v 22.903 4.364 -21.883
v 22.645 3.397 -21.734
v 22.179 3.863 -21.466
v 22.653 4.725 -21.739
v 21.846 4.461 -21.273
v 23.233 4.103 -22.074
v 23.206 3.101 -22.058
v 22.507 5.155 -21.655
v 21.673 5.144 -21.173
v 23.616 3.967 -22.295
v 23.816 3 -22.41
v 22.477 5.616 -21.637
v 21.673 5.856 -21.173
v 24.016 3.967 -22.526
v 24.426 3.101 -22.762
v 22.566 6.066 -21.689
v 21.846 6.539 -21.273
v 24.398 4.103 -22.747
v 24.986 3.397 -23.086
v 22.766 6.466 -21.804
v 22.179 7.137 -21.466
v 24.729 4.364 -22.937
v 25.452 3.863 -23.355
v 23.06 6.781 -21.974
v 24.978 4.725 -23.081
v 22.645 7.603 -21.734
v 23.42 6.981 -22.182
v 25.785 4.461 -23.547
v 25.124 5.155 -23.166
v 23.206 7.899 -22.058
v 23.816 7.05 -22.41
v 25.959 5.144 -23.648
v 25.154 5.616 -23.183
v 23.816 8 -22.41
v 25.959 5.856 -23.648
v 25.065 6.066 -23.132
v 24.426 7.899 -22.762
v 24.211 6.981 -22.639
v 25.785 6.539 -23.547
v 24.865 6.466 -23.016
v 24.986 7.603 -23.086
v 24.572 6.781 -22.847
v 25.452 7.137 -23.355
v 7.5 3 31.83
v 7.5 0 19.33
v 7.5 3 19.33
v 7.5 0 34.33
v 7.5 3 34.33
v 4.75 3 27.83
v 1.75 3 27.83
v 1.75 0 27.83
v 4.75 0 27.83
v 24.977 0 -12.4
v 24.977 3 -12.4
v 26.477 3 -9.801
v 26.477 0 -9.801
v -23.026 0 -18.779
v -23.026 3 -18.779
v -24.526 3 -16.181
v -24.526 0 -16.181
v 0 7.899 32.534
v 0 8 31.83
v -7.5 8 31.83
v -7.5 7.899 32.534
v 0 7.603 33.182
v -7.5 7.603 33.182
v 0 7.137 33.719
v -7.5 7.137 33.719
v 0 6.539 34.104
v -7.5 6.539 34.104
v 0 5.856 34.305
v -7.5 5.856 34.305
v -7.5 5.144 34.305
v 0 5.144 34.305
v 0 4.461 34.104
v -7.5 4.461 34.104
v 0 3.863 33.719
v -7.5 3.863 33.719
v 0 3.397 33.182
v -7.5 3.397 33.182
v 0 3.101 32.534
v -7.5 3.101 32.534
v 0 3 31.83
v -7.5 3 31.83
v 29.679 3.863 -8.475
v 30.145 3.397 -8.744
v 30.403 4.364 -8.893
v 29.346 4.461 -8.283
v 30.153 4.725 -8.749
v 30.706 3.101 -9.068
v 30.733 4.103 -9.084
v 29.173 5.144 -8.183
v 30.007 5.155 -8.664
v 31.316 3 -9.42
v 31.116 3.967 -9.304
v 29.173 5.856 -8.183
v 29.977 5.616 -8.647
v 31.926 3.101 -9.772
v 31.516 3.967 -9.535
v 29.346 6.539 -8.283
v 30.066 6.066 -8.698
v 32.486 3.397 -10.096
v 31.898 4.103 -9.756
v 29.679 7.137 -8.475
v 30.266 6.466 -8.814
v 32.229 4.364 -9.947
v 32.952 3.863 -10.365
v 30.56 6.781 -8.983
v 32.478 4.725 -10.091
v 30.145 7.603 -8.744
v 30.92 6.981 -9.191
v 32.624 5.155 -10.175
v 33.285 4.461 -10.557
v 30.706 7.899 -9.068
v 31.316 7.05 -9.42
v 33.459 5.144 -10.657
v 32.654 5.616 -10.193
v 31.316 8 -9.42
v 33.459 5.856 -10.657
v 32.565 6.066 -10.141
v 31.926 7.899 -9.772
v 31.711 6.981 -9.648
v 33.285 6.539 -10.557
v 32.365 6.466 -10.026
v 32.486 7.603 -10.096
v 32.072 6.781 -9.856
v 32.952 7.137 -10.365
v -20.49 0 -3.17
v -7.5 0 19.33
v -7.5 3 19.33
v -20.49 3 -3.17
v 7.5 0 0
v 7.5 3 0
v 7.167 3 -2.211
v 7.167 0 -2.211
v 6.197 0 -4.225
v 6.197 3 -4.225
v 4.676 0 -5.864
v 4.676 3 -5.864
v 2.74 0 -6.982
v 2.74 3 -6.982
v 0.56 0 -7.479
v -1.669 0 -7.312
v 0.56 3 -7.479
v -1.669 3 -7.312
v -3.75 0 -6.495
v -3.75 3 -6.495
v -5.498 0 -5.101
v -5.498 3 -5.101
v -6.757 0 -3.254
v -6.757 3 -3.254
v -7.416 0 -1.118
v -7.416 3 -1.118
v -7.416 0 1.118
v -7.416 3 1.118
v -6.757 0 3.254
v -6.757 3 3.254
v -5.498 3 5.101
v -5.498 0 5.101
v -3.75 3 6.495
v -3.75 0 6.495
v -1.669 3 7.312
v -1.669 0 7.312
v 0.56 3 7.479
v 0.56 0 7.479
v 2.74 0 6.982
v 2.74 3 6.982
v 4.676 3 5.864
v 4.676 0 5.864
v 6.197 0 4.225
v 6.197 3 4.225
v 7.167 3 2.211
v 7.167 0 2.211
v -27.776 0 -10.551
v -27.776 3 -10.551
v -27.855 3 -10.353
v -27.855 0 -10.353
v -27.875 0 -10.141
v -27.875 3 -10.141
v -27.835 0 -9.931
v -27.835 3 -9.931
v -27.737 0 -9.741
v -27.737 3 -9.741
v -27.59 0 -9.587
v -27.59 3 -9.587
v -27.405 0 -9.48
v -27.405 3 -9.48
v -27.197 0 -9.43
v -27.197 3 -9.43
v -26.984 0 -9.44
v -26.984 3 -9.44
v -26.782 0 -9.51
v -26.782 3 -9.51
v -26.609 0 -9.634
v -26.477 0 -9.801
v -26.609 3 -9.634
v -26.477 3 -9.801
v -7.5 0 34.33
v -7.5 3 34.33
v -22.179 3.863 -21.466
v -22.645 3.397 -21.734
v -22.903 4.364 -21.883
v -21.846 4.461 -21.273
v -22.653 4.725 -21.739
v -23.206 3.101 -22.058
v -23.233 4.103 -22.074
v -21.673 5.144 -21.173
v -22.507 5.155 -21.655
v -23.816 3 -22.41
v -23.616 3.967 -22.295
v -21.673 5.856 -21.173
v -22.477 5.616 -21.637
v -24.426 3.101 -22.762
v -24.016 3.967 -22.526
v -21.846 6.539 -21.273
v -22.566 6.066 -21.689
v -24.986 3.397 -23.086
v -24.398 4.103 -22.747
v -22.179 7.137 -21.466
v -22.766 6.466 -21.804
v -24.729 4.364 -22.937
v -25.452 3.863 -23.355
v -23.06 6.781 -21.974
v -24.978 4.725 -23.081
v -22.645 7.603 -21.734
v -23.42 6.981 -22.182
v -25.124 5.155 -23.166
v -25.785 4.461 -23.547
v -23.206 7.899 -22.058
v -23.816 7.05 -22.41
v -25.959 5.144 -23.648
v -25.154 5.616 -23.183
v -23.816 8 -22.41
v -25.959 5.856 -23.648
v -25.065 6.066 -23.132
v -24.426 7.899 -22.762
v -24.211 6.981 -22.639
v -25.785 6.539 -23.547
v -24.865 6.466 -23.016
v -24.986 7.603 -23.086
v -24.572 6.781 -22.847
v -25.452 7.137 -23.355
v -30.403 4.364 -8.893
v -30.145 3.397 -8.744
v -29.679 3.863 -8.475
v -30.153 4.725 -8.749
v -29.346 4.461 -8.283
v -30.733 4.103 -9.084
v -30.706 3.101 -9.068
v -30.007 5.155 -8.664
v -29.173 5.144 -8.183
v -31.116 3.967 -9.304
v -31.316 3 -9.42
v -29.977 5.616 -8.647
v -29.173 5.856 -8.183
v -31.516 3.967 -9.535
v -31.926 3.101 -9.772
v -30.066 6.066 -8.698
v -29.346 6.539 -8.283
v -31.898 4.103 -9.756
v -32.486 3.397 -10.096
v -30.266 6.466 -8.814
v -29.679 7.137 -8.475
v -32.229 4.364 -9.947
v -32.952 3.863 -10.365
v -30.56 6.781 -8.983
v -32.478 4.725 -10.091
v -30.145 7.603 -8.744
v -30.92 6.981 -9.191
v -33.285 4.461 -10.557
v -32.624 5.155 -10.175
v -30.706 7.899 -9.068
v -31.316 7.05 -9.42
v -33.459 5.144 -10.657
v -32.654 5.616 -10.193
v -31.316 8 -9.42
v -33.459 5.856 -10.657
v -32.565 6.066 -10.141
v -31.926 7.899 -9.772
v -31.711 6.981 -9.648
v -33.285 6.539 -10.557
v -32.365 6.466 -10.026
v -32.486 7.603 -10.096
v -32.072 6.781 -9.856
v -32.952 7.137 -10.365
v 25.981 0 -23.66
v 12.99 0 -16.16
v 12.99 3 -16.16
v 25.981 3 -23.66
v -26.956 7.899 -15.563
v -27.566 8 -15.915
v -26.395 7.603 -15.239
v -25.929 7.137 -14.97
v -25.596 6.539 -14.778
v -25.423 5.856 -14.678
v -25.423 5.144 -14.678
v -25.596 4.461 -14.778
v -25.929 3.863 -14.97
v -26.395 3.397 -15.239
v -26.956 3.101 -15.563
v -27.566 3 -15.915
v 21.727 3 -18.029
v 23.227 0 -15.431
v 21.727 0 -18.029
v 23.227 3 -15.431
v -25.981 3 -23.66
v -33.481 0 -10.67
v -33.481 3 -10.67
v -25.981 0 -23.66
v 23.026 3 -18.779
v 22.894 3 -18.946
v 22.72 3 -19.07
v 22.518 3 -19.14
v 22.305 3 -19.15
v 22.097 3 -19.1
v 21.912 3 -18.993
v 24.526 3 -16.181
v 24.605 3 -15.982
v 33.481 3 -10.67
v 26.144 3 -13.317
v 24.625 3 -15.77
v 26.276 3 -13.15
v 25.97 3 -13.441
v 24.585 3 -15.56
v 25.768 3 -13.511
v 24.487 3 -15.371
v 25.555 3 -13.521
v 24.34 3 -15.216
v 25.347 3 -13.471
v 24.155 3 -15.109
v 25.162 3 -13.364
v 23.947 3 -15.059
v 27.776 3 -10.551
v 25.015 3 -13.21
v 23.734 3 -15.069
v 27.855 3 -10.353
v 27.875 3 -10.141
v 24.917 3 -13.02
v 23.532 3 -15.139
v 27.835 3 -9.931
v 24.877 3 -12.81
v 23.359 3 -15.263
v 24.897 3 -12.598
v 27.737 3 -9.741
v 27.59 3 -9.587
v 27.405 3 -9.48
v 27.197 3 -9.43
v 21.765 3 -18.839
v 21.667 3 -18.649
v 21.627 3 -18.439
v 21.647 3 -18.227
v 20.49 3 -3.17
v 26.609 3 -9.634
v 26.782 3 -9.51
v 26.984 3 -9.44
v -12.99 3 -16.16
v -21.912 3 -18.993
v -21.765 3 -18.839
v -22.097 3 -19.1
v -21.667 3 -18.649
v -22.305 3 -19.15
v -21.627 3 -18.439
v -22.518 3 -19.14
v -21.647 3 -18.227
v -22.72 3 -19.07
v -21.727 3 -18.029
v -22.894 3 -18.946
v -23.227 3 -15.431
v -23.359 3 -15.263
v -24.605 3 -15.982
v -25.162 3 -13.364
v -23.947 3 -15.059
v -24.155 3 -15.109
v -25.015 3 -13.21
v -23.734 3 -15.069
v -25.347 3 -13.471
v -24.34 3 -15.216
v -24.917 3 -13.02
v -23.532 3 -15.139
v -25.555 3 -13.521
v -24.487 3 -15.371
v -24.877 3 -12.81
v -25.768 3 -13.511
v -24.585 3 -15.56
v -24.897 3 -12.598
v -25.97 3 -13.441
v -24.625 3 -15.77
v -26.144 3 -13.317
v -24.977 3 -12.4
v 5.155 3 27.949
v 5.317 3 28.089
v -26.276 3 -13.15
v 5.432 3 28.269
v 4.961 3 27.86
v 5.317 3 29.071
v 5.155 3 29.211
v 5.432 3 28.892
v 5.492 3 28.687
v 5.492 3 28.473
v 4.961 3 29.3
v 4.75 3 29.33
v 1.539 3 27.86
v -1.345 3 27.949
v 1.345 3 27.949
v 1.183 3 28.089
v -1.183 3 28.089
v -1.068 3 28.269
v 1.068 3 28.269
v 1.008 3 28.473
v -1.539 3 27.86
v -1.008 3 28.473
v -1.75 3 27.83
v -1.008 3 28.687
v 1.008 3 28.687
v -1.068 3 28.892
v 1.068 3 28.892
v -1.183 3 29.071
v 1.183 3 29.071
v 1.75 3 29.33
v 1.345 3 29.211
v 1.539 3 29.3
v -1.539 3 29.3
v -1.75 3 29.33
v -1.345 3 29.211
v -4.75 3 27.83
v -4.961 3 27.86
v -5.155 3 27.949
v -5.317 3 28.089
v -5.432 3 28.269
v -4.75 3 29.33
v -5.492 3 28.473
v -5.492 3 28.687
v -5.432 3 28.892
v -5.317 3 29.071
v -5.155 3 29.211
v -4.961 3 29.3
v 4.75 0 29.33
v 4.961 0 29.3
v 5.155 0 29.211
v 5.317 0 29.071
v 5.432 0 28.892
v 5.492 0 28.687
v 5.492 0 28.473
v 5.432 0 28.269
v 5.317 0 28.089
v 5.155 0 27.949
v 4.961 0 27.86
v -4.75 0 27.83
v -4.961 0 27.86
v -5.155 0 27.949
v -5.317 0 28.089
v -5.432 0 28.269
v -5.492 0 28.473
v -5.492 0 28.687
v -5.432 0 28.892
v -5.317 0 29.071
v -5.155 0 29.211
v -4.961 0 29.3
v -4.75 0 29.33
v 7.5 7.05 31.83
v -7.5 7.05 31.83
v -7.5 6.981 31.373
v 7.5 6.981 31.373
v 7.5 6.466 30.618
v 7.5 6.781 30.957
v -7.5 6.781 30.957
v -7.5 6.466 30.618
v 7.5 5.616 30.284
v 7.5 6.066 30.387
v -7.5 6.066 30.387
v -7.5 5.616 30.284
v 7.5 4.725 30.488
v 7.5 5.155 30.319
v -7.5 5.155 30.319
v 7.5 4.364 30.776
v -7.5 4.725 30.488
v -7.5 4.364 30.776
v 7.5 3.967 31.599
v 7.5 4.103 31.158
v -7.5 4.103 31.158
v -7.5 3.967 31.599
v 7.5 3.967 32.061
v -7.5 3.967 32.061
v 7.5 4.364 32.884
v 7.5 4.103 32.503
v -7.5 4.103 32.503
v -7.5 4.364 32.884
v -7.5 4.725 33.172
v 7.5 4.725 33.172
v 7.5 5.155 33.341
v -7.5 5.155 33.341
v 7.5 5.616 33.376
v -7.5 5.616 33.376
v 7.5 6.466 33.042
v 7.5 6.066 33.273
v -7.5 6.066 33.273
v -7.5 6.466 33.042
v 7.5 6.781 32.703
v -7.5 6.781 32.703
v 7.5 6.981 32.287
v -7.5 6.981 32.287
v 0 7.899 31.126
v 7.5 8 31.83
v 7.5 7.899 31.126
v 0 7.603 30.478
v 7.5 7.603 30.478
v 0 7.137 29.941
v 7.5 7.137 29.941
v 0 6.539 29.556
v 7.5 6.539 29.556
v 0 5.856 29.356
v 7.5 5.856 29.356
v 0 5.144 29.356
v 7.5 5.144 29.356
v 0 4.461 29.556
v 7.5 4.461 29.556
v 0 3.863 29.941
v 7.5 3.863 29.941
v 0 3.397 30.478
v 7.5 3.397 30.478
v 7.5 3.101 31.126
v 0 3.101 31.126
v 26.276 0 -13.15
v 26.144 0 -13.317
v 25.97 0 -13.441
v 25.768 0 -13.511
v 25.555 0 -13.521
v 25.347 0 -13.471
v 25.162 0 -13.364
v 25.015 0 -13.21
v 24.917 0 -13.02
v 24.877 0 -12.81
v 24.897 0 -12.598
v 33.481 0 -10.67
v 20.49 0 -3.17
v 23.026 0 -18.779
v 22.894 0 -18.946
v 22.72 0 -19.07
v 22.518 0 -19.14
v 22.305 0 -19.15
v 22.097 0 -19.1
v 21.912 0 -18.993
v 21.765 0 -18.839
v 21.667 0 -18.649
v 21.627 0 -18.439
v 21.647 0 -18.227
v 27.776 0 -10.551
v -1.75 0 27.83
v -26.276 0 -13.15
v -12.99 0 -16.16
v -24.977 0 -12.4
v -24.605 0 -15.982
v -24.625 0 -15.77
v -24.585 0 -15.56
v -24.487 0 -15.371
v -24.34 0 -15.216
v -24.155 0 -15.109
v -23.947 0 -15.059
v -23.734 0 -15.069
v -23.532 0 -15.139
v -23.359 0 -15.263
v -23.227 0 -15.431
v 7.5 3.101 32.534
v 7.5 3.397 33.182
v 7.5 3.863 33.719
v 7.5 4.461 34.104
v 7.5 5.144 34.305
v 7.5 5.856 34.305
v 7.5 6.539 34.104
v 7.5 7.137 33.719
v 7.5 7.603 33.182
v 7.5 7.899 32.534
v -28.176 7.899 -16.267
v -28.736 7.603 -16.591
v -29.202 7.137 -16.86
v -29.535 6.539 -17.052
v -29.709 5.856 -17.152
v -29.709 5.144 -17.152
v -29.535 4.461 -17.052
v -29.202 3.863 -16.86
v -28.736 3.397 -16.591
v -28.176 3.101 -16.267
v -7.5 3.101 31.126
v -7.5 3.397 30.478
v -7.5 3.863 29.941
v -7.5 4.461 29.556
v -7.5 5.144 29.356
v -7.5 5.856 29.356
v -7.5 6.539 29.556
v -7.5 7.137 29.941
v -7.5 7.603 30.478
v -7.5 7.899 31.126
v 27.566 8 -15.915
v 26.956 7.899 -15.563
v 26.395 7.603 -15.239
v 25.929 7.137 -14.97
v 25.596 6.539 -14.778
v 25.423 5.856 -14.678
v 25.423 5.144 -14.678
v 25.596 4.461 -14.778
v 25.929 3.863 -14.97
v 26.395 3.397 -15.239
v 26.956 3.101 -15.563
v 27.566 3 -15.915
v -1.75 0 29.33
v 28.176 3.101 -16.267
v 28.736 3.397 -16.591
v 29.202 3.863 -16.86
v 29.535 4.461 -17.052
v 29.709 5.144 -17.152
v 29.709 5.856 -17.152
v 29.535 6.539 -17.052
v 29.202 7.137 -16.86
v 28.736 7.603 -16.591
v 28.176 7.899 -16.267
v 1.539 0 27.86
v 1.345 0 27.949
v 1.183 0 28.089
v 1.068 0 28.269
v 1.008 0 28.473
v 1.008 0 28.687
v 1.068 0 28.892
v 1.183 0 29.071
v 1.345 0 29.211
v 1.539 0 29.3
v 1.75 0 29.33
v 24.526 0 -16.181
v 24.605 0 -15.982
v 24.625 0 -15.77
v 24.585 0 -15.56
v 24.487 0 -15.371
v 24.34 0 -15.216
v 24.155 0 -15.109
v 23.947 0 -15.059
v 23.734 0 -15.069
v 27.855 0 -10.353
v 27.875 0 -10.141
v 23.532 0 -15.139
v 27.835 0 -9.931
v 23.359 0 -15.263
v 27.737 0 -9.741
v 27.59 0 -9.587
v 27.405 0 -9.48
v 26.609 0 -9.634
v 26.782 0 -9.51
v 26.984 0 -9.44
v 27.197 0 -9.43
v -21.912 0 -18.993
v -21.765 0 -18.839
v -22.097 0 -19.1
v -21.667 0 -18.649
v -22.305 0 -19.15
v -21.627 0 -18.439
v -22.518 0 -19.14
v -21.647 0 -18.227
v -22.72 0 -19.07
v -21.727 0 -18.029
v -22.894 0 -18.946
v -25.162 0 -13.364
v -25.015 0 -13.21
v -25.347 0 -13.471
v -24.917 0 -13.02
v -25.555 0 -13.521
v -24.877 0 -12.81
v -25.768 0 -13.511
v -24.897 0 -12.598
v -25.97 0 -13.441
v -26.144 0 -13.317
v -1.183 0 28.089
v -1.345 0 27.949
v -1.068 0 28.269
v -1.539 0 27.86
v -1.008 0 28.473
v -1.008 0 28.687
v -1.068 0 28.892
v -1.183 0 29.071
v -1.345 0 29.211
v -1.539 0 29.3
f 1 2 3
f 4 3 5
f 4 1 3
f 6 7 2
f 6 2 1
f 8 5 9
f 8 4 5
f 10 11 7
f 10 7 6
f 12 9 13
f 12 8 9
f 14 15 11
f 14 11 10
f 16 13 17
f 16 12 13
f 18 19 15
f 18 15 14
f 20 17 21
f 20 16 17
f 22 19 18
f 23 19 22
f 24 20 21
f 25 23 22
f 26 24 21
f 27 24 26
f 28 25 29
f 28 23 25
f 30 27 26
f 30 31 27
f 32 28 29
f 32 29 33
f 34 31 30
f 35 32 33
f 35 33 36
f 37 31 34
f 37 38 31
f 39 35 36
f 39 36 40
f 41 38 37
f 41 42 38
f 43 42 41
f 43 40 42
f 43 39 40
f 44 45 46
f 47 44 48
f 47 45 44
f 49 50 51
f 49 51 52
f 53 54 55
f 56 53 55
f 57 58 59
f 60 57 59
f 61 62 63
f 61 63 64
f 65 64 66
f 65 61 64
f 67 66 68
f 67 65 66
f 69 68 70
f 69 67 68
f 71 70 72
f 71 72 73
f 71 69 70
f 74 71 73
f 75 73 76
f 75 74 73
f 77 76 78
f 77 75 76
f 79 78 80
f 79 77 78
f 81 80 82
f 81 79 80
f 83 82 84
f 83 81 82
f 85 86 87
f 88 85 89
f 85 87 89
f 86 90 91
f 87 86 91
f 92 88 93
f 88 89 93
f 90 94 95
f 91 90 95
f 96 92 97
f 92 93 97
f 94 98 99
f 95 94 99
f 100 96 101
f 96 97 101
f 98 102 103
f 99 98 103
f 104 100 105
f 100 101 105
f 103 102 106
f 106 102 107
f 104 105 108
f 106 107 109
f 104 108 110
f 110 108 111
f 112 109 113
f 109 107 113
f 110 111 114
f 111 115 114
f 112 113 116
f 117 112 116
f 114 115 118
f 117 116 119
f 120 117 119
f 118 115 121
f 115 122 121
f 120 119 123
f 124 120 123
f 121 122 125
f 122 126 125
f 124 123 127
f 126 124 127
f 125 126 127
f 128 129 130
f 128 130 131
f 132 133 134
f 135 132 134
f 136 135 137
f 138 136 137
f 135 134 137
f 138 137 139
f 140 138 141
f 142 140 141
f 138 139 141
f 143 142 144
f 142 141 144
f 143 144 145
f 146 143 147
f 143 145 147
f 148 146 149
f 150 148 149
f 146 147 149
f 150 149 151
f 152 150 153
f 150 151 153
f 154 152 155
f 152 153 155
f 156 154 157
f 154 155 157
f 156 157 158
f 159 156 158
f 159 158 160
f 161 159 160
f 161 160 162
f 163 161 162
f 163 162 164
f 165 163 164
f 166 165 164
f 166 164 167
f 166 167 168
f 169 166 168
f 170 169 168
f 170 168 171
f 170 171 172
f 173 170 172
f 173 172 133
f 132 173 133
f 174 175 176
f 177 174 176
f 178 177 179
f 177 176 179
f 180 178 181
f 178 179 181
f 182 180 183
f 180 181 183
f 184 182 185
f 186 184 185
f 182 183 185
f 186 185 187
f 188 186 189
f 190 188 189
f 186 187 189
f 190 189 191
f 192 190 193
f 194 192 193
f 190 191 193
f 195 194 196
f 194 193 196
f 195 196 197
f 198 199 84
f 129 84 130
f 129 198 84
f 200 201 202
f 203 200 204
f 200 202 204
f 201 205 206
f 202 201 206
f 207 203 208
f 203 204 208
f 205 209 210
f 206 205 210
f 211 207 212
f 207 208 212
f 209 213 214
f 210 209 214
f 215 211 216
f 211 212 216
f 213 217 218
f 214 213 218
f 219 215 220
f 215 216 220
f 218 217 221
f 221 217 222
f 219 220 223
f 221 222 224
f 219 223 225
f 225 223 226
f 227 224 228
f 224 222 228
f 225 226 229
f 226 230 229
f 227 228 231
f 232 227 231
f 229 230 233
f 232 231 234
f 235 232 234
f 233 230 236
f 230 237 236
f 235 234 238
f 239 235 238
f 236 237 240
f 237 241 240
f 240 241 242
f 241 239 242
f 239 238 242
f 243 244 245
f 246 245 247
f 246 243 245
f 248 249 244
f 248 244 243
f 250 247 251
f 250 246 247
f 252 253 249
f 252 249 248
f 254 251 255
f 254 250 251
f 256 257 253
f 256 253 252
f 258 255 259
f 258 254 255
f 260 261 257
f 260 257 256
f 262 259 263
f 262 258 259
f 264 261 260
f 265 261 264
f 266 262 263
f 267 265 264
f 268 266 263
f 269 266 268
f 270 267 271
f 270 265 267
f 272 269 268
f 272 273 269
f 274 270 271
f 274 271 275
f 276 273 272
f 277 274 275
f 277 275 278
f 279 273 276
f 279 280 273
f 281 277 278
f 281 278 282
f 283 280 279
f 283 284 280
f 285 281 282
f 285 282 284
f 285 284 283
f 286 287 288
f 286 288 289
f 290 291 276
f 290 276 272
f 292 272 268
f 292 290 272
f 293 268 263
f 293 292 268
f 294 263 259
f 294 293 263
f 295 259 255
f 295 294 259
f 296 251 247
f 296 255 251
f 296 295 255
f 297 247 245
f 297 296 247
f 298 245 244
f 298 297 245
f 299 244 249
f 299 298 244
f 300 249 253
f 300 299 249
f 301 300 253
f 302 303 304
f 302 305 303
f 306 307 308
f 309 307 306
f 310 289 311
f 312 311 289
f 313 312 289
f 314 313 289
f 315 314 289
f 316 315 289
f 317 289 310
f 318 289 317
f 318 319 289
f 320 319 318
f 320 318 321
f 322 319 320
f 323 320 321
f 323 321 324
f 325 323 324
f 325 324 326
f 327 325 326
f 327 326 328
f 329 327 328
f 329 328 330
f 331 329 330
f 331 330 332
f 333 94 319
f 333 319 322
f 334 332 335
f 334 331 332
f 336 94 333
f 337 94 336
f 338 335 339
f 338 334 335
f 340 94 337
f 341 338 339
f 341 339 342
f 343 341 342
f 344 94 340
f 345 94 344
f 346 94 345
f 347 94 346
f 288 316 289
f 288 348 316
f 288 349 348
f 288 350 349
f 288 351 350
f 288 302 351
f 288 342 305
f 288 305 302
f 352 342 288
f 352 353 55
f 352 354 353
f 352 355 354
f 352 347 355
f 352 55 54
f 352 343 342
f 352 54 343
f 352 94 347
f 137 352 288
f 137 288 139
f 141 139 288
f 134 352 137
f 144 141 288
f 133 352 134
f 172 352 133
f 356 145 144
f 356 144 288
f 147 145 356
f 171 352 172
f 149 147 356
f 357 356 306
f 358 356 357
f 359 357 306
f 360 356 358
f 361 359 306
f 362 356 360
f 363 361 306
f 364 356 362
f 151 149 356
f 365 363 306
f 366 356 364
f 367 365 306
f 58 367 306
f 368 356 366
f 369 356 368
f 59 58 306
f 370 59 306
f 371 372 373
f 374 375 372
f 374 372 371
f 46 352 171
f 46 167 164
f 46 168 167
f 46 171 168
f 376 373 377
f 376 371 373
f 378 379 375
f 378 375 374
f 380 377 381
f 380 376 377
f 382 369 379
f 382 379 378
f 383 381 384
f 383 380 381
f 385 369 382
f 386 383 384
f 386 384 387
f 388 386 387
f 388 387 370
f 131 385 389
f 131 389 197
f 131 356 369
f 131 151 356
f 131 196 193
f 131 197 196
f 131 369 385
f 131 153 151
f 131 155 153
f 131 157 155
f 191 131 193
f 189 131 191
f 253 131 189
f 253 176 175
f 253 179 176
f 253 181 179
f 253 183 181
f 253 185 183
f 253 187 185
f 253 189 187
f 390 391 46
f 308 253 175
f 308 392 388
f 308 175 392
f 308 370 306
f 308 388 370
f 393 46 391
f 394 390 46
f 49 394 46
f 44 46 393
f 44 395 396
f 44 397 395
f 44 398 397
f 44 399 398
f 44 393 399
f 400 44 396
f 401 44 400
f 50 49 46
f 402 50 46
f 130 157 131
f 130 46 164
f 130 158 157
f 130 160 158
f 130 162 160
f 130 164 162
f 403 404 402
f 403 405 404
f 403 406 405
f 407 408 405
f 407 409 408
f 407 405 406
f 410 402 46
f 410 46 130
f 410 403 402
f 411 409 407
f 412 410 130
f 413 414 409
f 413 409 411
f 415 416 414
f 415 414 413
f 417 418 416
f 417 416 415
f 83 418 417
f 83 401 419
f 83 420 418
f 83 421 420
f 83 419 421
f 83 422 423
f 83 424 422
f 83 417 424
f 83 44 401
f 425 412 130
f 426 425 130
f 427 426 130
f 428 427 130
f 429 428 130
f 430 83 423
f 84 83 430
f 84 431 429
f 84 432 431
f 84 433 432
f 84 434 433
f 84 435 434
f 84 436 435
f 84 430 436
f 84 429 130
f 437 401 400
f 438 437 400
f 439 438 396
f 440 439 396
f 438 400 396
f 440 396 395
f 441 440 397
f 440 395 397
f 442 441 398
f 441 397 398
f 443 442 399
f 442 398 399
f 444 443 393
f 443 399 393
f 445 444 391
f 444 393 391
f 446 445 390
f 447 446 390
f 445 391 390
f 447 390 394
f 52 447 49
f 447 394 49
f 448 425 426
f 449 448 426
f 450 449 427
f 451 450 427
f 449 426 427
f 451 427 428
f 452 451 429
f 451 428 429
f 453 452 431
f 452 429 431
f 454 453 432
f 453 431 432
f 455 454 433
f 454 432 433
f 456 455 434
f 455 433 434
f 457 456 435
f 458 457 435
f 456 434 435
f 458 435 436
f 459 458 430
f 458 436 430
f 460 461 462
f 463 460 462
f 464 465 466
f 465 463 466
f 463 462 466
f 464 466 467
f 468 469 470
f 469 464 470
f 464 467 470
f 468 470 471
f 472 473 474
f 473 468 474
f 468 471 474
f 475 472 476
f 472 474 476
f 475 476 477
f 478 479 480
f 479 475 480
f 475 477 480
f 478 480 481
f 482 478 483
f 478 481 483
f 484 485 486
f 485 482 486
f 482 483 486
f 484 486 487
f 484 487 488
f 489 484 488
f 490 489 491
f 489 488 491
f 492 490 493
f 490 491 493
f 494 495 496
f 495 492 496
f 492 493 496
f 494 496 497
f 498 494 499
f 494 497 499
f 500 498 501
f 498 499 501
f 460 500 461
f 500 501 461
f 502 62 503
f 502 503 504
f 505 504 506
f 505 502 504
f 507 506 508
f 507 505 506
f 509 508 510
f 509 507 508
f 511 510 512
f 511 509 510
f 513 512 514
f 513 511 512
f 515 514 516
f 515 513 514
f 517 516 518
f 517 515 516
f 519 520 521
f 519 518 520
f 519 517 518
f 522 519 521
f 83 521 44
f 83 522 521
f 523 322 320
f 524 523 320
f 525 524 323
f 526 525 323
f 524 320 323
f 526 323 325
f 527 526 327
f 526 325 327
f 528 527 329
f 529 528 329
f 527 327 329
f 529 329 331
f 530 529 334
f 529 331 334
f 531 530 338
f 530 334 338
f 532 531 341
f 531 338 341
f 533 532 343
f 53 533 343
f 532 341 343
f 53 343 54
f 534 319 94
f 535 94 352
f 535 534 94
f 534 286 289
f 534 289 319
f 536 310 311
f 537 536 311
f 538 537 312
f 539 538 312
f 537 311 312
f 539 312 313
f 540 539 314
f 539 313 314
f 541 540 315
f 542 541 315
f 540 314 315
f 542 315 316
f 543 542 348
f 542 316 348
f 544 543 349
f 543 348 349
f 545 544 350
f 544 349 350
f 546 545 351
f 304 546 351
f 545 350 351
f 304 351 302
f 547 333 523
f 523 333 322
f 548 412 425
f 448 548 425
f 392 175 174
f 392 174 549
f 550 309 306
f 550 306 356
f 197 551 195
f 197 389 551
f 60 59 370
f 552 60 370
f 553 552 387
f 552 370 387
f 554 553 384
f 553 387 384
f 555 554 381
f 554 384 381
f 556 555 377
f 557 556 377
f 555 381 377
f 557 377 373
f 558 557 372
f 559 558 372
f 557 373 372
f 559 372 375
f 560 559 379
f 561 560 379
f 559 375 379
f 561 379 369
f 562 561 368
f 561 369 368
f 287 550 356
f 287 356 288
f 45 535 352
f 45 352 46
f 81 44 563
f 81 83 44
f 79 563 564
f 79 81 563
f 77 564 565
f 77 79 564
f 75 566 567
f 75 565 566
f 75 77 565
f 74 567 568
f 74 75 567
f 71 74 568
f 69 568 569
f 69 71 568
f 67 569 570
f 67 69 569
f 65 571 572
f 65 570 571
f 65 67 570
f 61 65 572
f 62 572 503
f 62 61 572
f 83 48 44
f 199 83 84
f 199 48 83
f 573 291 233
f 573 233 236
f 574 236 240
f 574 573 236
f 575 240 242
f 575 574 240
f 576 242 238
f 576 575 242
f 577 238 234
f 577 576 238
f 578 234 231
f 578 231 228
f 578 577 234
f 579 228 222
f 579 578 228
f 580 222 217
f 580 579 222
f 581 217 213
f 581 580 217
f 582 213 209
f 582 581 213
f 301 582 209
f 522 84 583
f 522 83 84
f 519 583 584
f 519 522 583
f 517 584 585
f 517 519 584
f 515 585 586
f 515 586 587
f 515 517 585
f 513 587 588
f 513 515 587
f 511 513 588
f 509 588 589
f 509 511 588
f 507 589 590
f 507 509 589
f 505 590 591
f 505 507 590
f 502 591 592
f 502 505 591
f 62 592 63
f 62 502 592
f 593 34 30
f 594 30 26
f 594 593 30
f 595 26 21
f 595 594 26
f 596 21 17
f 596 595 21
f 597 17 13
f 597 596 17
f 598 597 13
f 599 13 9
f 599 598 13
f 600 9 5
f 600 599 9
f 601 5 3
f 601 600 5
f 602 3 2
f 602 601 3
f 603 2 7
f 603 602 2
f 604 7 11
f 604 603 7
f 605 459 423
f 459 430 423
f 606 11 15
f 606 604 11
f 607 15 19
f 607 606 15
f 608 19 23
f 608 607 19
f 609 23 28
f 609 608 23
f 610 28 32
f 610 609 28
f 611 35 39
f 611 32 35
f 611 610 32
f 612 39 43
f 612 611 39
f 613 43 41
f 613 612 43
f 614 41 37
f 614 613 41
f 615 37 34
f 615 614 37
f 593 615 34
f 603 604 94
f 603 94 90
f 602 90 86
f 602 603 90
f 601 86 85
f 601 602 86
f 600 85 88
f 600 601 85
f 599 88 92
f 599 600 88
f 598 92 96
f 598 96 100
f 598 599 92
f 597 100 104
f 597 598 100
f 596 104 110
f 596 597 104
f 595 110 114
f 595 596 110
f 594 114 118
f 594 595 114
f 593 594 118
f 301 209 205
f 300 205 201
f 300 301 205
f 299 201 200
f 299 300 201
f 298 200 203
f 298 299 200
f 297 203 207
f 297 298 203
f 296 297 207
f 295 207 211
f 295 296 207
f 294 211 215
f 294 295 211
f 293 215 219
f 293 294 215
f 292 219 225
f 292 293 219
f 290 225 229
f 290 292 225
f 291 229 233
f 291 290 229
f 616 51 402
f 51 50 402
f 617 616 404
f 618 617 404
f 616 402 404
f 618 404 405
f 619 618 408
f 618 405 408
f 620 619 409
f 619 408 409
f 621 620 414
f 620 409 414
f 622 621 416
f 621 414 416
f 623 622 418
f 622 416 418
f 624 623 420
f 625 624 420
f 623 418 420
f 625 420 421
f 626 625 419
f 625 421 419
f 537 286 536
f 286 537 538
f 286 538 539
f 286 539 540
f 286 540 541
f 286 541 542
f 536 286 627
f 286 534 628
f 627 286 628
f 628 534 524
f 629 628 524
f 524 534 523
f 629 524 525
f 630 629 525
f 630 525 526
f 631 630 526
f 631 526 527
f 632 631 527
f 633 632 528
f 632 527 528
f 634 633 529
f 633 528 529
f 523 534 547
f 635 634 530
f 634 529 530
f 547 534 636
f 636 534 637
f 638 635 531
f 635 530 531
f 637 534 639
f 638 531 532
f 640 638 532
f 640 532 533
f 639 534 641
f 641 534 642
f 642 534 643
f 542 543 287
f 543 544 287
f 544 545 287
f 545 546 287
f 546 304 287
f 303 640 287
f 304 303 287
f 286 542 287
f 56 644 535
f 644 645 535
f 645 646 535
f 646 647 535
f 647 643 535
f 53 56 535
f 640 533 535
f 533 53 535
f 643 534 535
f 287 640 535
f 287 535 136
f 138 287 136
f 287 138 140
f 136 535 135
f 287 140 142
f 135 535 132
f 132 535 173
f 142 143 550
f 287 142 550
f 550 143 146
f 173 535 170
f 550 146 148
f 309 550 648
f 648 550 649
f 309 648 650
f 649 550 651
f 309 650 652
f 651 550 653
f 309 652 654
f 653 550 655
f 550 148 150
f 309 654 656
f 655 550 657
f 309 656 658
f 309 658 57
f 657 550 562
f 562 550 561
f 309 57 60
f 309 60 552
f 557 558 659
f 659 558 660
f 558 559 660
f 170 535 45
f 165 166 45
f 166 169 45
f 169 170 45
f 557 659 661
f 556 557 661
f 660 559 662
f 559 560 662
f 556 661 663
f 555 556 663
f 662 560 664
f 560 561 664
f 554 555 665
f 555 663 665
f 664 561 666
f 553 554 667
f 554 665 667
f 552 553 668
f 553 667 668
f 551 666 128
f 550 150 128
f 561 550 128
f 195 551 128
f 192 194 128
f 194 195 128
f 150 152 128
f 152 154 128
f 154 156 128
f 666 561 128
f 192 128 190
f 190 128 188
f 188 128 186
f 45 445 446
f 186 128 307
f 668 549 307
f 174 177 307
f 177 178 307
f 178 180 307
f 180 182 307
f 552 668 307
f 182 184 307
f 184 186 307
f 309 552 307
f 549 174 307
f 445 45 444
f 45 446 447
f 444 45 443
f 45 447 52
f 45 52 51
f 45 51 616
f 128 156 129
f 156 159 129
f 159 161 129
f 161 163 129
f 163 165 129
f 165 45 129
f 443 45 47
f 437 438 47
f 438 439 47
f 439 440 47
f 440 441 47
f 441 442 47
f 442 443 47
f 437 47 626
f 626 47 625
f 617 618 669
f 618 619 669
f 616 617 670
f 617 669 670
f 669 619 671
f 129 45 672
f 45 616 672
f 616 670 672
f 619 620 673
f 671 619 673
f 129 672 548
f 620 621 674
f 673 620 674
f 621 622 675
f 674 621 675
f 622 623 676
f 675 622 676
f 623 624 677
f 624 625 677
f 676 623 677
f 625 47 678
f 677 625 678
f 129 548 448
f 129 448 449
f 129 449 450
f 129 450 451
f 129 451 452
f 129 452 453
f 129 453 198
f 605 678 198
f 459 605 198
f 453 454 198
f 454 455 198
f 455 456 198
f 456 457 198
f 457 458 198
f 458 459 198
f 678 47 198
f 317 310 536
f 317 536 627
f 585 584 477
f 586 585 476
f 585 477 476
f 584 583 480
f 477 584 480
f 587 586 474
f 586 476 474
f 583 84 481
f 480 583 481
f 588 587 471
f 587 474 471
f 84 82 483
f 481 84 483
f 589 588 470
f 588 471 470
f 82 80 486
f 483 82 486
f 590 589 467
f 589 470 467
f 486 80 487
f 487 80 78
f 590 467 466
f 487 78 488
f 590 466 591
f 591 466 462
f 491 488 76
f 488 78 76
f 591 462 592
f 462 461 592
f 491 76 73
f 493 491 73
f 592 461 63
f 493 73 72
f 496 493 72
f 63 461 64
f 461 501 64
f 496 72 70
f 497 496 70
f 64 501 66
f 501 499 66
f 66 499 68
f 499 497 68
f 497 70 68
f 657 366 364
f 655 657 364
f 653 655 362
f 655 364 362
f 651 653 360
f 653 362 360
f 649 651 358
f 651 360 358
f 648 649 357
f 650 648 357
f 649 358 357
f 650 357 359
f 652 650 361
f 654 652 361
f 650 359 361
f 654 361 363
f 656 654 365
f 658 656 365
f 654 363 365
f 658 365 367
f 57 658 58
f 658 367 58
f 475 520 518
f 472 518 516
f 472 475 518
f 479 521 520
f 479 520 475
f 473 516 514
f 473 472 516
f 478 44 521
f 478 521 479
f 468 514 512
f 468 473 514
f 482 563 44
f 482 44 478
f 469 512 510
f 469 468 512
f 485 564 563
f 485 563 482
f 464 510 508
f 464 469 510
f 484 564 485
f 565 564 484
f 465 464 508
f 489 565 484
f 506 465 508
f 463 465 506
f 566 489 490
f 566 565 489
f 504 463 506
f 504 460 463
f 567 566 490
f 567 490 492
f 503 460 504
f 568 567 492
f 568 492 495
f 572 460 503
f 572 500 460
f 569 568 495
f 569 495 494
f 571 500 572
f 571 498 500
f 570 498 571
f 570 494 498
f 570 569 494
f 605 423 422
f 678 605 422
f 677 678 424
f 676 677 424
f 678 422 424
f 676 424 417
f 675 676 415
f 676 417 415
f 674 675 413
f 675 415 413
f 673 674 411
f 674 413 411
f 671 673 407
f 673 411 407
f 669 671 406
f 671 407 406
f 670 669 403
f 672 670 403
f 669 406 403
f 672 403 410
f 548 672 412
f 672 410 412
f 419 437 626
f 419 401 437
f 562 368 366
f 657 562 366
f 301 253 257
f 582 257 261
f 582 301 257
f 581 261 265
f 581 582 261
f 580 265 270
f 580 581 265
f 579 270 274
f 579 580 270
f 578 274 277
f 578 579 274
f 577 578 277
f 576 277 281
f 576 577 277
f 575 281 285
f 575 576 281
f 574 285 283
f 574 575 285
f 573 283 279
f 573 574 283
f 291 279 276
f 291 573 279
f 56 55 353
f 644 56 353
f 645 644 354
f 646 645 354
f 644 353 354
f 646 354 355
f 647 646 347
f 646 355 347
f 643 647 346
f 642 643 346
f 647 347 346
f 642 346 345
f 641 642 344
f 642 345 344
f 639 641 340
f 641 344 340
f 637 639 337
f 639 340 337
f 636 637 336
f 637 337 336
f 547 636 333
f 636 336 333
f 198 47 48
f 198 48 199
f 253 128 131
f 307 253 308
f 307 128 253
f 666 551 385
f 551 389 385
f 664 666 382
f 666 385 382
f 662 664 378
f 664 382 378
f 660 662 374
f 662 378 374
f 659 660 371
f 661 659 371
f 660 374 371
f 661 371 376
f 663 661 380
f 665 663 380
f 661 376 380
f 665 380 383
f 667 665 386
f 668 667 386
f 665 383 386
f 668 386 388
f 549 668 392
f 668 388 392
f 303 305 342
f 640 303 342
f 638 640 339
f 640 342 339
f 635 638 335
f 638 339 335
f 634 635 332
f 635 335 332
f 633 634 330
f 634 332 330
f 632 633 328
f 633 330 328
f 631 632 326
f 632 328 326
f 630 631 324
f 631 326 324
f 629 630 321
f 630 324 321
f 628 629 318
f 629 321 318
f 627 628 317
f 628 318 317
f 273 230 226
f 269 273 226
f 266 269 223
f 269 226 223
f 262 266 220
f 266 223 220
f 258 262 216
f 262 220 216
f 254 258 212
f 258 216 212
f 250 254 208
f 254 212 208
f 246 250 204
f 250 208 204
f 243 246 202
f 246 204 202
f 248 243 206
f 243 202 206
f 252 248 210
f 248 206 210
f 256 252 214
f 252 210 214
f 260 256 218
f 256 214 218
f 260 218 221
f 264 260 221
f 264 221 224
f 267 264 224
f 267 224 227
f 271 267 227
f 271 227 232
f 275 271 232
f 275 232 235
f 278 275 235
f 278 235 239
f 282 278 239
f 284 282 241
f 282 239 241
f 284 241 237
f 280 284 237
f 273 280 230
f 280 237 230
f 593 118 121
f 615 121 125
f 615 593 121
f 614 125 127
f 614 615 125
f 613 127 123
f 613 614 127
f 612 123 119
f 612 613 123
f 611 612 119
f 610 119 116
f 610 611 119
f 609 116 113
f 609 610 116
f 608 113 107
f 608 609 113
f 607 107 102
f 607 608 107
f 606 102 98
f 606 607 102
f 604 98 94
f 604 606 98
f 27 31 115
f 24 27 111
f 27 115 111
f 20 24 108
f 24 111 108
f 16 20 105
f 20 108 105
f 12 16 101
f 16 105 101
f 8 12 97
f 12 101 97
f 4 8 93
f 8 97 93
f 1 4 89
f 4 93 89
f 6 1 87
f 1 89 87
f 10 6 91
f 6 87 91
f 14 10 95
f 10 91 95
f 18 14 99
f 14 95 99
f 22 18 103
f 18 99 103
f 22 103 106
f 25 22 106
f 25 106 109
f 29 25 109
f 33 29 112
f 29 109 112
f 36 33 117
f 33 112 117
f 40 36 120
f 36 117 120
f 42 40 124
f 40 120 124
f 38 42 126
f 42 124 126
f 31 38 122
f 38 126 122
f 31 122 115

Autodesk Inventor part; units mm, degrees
ref_plane "YZ Plane" through (0, 0, 0) normal (1, 0, 0) x (0, 1, 0)
ref_plane "XZ Plane" through (0, 0, 0) normal (0, 1, 0) x (-1, 0, 0)
ref_plane "XY Plane" through (0, 0, 0) normal (0, 0, 1) x (1, 0, 0)
sketch "Sketch1" plane through (0, 0, 0) normal (0, 1, 0) x (-1, 0, 0)
  line L0 (-7.5, 19.3301) -> (-7.5, 34.3301)
  line L1 (-7.5, 34.3301) -> (7.5, 34.3301)
  line L2 (7.5, 34.3301) -> (7.5, 19.3301)
  line L3 (20.4904, -3.1699) -> (33.4808, -10.6699)
  line L4 (33.4808, -10.6699) -> (25.9808, -23.6603)
  line L5 (25.9808, -23.6603) -> (12.9904, -16.1603)
  line L6 (-12.9904, -16.1603) -> (-25.9808, -23.6603)
  line L7 (-25.9808, -23.6603) -> (-33.4808, -10.6699)
  line L8 (-33.4808, -10.6699) -> (-20.4904, -3.1699)
  line L9 (7.5, 19.3301) -> (20.4904, -3.1699)
  line L10 (12.9904, -16.1603) -> (-12.9904, -16.1603)
  line L11 (-20.4904, -3.1699) -> (-7.5, 19.3301)
  point P0 (0, 0)
  point P1 (0, 0)
extrude "Extrusion1" add sketch "Sketch1" along normal blind 3
sketch "Sketch2" plane through (0, 3, 0) normal (0, 1, 0) x (1, 0, 0)
  circle A0 centre (0, 0) radius 7.5
  line L0 (33.4808, 10.6699) -> (25.9808, 23.6603) projected
  line L1 (29.7308, 17.1651) -> (35.4808, 17.1651) construction
  line L2 (20.4904, 3.1699) -> (33.4808, 10.6699) projected
  line L3 (25.6261, 12.7745) -> (27.1261, 10.1764) construction
  line L4 (24.9766, 12.3995) -> (26.4766, 9.8014)
  line L5 (27.7756, 10.5514) -> (26.2756, 13.1495)
  arc A1 (26.2756, 13.1495) -> (24.9766, 12.3995) centre (25.6261, 12.7745) ccw
  arc A2 (26.4766, 9.8014) -> (27.7756, 10.5514) centre (27.1261, 10.1764) ccw
  line L6 (23.8761, 15.8056) -> (22.3761, 18.4037) construction
  line L7 (23.2266, 15.4306) -> (21.7266, 18.0287)
  line L8 (23.0256, 18.7787) -> (24.5256, 16.1806)
  arc A3 (23.2266, 15.4306) -> (24.5256, 16.1806) centre (23.8761, 15.8056) ccw
  arc A4 (23.0256, 18.7787) -> (21.7266, 18.0287) centre (22.3761, 18.4037) ccw
  line L9 (-23.2266, 15.4306) -> (-21.7266, 18.0287)
  arc A5 (-21.7266, 18.0287) -> (-23.0256, 18.7787) centre (-22.3761, 18.4037) ccw
  arc A6 (-24.5256, 16.1806) -> (-23.2266, 15.4306) centre (-23.8761, 15.8056) ccw
  line L10 (-23.8761, 15.8056) -> (-22.3761, 18.4037) construction
  line L11 (-23.0256, 18.7787) -> (-24.5256, 16.1806)
  arc A7 (-24.9766, 12.3995) -> (-26.2756, 13.1495) centre (-25.6261, 12.7745) ccw
  line L12 (-24.9766, 12.3995) -> (-26.4766, 9.8014)
  arc A8 (-27.7756, 10.5514) -> (-26.4766, 9.8014) centre (-27.1261, 10.1764) ccw
  line L13 (-27.7756, 10.5514) -> (-26.2756, 13.1495)
  line L14 (-29.7308, 17.1651) -> (-32.6058, 22.1447) construction
  line L15 (-25.6261, 12.7745) -> (-27.1261, 10.1764) construction
  line L16 (-1.75, -27.8301) -> (-4.75, -27.8301)
  arc A9 (-4.75, -27.8301) -> (-4.75, -29.3301) centre (-4.75, -28.5801) ccw
  arc A10 (-1.75, -29.3301) -> (-1.75, -27.8301) centre (-1.75, -28.5801) ccw
  line L17 (-1.75, -28.5801) -> (-4.75, -28.5801) construction
  line L18 (-4.75, -29.3301) -> (-1.75, -29.3301)
  arc A11 (1.75, -27.8301) -> (1.75, -29.3301) centre (1.75, -28.5801) ccw
  line L19 (1.75, -27.8301) -> (4.75, -27.8301)
  arc A12 (4.75, -29.3301) -> (4.75, -27.8301) centre (4.75, -28.5801) ccw
  line L20 (4.75, -29.3301) -> (1.75, -29.3301)
  line L21 (0, -34.3301) -> (-2.875, -39.3098) construction
  line L22 (1.75, -28.5801) -> (4.75, -28.5801) construction
  point P0 (26.3761, 11.4755)
  point P1 (23.1261, 17.1046)
  point P2 (-12.9904, 16.1603)
  point P3 (-23.1261, 17.1046)
  point P4 (-26.3761, 11.4755)
  point P5 (-25.9808, 23.6603)
  point P6 (-33.4808, 10.6699)
  point P7 (-7.5, -19.3301)
  point P8 (-3.25, -28.5801)
  point P9 (3.25, -28.5801)
  point P10 (-7.5, -34.3301)
  point P11 (7.5, -34.3301)
  dimension "d5" = 15
  dimension "d10" = 1.5
  dimension "d11" = 1.5
  dimension "d14" = 360
extrude "Extrusion2" cut sketch "Sketch2" against normal blind 3
sketch "Sketch3" plane through (0, 0, 0) normal (1, 0, 0) x (0, 1, 0)
  line L0 (3, 19.3301) -> (3, 34.3301) projected
  circle A0 centre (5.5, 31.8301) radius 2.5
  circle A1 centre (5.5, 31.8301) radius 1.55
  point P0 (0, 0)
  point P1 (3, 29.3301)
  dimension "d19" = 3.1
extrude "Extrusion3" add sketch "Sketch3" along normal mid plane 15
pattern_circular "Circular Pattern1" count 3 over 360 about axis through (0, 3, 0) along (0, -1, 0) of "Extrusion3"
properties part number "end effector"
